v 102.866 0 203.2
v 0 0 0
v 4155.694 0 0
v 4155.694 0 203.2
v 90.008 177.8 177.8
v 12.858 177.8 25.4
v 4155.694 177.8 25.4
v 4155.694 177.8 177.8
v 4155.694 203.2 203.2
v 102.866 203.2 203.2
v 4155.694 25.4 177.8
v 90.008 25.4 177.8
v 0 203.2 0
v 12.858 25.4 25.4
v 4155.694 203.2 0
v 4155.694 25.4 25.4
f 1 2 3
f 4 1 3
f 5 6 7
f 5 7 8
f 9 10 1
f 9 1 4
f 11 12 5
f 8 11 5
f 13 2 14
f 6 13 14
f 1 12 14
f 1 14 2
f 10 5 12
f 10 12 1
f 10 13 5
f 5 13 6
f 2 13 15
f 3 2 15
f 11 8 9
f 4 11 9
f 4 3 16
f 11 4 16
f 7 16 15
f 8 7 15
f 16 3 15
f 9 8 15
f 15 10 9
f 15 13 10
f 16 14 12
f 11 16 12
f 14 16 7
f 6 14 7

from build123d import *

# Parameters (mm, degrees)
SKETCH2_W               = 4155.694
SKETCH2_H               = 203.2
BOSS_EXTRUDE1_DEPTH     = 203.2
SKETCH3_W               = 152.4
SKETCH3_H               = 152.4
CUT_EXTRUDE1_DEPTH      = 1
CUT_EXTRUDE1_DEPTH_BACK = 4156.694
CUT_EXTRUDE2_DEPTH      = 1
CUT_EXTRUDE2_DEPTH_BACK = 204.2


with BuildPart() as part:
    # Sketch2 → Boss-Extrude1 (new body)
    with BuildSketch(Plane.XY):
        with Locations((2077.847, 101.6)):
            Rectangle(SKETCH2_W, SKETCH2_H)
    extrude(amount=BOSS_EXTRUDE1_DEPTH)

    # Sketch3 → Cut-Extrude1 (cut, two sides)
    with BuildSketch(Plane.ZY) as cut_extrude1_sk:
        with Locations((101.6, 101.6)):
            Rectangle(SKETCH3_W, SKETCH3_H)
    extrude(amount=CUT_EXTRUDE1_DEPTH, mode=Mode.SUBTRACT)
    extrude(cut_extrude1_sk.sketch, amount=-CUT_EXTRUDE1_DEPTH_BACK, mode=Mode.SUBTRACT)

    # Sketch4 → Cut-Extrude2 (cut, two sides)
    with BuildSketch(Plane(origin=(0, 203.2, 0), x_dir=(1, 0, 0), z_dir=(0, 1, 0))) as cut_extrude2_sk:
        Polygon((0, 0), (102.866376443, -203.2), (0, -203.2), align=None)
    extrude(amount=CUT_EXTRUDE2_DEPTH, mode=Mode.SUBTRACT)
    extrude(cut_extrude2_sk.sketch, amount=-CUT_EXTRUDE2_DEPTH_BACK, mode=Mode.SUBTRACT)


solid = part.part
